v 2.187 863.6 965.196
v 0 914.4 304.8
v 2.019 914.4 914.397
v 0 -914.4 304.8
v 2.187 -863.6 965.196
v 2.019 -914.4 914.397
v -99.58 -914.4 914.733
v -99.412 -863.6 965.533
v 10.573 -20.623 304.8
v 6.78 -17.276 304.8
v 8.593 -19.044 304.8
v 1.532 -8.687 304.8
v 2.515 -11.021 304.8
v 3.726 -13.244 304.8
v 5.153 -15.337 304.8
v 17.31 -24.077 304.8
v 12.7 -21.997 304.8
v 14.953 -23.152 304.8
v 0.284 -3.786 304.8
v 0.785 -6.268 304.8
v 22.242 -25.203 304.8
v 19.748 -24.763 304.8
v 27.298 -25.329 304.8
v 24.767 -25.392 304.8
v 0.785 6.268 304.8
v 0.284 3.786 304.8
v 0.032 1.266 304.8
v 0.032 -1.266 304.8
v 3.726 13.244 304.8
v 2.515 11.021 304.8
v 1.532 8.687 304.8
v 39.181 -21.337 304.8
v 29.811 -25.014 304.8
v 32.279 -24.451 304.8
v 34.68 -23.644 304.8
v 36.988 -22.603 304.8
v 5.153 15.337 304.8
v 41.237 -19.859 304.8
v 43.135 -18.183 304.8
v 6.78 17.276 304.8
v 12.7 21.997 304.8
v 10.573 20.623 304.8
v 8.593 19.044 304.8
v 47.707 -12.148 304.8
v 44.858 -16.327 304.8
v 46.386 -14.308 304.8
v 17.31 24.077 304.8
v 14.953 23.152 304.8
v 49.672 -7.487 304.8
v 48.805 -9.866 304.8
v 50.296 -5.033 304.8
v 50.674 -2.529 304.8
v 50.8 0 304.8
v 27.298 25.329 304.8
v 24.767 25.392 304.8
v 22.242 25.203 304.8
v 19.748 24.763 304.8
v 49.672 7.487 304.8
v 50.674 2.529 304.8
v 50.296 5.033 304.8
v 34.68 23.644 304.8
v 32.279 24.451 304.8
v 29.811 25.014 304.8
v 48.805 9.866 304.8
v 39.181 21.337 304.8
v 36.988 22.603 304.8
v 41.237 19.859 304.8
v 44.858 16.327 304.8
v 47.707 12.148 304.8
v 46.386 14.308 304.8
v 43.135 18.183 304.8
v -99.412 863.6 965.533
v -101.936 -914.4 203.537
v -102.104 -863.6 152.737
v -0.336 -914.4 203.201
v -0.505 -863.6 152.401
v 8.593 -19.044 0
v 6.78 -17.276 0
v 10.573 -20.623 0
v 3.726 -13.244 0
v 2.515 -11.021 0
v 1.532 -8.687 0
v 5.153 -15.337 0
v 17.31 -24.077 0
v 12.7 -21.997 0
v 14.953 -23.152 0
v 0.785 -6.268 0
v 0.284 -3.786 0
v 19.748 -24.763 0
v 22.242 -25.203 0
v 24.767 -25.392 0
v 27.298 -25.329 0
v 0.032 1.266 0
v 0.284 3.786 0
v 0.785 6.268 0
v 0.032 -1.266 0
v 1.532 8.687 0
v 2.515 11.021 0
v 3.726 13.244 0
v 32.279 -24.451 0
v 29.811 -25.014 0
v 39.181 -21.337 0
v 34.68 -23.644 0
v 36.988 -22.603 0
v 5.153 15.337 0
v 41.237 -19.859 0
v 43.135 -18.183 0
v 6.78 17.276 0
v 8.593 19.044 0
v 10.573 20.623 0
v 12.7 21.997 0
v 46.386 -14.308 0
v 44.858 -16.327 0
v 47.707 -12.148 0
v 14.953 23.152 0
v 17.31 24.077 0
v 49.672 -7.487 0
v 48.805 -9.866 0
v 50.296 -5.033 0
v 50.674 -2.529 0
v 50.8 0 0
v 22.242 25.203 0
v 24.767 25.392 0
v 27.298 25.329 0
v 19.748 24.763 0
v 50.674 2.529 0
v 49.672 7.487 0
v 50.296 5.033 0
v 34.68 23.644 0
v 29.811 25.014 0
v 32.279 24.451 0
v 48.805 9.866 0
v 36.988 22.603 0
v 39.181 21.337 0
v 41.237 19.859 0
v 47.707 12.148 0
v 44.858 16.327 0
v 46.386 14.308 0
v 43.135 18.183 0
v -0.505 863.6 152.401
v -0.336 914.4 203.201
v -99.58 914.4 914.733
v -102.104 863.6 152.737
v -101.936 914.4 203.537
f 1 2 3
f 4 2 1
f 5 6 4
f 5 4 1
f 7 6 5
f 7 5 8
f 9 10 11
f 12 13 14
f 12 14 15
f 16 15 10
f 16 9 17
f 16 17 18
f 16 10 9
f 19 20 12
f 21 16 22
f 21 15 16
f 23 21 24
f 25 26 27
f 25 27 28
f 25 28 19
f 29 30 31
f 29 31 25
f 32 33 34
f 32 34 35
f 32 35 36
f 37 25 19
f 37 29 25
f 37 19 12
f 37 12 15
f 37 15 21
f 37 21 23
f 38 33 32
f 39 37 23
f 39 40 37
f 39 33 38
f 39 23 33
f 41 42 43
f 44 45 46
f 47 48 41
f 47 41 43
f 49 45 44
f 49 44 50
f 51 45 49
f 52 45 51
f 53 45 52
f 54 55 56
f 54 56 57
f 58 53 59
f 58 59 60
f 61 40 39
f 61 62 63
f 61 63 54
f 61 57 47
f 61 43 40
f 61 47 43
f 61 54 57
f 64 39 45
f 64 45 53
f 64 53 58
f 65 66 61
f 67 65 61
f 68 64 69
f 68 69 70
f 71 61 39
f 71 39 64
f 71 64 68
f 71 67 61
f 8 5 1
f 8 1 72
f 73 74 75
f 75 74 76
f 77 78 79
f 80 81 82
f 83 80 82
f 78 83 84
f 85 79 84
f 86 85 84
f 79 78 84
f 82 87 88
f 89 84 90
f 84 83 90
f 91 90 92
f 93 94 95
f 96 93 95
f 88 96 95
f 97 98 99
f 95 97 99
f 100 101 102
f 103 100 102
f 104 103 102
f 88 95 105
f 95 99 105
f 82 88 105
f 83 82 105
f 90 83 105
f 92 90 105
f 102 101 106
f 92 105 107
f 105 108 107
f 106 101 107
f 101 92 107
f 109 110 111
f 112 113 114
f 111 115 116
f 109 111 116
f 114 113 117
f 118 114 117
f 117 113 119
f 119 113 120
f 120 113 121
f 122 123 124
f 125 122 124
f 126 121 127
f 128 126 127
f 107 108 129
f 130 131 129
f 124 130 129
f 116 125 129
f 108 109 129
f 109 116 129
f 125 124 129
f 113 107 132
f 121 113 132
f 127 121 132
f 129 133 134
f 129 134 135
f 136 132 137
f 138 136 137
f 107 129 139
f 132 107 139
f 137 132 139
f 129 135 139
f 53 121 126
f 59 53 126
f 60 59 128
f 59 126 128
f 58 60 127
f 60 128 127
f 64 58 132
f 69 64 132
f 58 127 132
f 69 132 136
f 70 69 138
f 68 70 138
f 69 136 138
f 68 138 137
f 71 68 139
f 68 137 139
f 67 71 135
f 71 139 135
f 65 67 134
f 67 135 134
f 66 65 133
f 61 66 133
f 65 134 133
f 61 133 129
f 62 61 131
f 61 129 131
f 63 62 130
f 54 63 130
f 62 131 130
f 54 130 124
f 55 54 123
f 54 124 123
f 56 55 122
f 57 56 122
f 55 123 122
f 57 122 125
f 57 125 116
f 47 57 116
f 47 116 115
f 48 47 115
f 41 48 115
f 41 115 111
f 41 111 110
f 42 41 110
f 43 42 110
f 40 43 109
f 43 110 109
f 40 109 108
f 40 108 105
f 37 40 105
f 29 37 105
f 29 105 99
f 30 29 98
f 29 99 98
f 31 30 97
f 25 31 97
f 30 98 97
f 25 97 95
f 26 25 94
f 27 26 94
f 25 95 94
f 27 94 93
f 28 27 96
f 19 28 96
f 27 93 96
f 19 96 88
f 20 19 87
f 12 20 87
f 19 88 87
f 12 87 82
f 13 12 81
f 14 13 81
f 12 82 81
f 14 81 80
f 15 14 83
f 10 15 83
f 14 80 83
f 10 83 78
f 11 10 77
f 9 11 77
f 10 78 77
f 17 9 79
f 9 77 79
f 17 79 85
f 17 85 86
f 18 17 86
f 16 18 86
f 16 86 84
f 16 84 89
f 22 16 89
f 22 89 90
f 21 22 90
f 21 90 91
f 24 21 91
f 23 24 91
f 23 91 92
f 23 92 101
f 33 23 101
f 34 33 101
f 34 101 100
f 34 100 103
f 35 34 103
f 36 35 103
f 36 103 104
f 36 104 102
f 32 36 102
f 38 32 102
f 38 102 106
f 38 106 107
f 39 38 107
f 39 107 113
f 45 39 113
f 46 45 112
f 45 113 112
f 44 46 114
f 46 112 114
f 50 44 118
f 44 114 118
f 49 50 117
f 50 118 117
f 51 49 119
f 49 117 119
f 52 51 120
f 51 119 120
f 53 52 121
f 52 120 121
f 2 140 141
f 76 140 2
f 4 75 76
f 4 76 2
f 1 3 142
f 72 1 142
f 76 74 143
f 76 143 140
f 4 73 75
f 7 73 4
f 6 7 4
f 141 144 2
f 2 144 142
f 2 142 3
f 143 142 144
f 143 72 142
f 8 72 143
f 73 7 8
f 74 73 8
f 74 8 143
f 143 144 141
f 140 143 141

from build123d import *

# Parameters (mm, degrees)
F1_DEPTH = 914.4
F2_SIZE  = 50.8
F3_R     = 25.4
F4_DEPTH = 304.8


with BuildPart() as f1:
    # F0 (on Front) → F1 (new body, symmetric)
    with BuildSketch(Plane.XZ):
        Polygon((-99.412247, 965.53287), (-102.10418, 152.737328), (-0.504738, 152.400836), (0, 304.8), (2.187196, 965.196378), align=None)
    extrude(amount=F1_DEPTH, both=True)

    # F2
    f2_edges = [f1.edges().sort_by_distance(p)[0] for p in [
        (-51.304459, -914.4, 152.569082),
        (-48.612525, -914.4, 965.364624),
        (-48.612525, 914.4, 965.364624),
        (-51.304459, 914.4, 152.569082),
    ]]
    chamfer(f2_edges, length=F2_SIZE)


with BuildPart() as f4:
    # F3 (on Top) → F4 (new body, through all)
    with BuildSketch(Plane.XY):
        with Locations((25.4, 0)):
            Circle(F3_R)
    extrude(amount=F4_DEPTH)


solid = Compound([f1.part, f4.part])
